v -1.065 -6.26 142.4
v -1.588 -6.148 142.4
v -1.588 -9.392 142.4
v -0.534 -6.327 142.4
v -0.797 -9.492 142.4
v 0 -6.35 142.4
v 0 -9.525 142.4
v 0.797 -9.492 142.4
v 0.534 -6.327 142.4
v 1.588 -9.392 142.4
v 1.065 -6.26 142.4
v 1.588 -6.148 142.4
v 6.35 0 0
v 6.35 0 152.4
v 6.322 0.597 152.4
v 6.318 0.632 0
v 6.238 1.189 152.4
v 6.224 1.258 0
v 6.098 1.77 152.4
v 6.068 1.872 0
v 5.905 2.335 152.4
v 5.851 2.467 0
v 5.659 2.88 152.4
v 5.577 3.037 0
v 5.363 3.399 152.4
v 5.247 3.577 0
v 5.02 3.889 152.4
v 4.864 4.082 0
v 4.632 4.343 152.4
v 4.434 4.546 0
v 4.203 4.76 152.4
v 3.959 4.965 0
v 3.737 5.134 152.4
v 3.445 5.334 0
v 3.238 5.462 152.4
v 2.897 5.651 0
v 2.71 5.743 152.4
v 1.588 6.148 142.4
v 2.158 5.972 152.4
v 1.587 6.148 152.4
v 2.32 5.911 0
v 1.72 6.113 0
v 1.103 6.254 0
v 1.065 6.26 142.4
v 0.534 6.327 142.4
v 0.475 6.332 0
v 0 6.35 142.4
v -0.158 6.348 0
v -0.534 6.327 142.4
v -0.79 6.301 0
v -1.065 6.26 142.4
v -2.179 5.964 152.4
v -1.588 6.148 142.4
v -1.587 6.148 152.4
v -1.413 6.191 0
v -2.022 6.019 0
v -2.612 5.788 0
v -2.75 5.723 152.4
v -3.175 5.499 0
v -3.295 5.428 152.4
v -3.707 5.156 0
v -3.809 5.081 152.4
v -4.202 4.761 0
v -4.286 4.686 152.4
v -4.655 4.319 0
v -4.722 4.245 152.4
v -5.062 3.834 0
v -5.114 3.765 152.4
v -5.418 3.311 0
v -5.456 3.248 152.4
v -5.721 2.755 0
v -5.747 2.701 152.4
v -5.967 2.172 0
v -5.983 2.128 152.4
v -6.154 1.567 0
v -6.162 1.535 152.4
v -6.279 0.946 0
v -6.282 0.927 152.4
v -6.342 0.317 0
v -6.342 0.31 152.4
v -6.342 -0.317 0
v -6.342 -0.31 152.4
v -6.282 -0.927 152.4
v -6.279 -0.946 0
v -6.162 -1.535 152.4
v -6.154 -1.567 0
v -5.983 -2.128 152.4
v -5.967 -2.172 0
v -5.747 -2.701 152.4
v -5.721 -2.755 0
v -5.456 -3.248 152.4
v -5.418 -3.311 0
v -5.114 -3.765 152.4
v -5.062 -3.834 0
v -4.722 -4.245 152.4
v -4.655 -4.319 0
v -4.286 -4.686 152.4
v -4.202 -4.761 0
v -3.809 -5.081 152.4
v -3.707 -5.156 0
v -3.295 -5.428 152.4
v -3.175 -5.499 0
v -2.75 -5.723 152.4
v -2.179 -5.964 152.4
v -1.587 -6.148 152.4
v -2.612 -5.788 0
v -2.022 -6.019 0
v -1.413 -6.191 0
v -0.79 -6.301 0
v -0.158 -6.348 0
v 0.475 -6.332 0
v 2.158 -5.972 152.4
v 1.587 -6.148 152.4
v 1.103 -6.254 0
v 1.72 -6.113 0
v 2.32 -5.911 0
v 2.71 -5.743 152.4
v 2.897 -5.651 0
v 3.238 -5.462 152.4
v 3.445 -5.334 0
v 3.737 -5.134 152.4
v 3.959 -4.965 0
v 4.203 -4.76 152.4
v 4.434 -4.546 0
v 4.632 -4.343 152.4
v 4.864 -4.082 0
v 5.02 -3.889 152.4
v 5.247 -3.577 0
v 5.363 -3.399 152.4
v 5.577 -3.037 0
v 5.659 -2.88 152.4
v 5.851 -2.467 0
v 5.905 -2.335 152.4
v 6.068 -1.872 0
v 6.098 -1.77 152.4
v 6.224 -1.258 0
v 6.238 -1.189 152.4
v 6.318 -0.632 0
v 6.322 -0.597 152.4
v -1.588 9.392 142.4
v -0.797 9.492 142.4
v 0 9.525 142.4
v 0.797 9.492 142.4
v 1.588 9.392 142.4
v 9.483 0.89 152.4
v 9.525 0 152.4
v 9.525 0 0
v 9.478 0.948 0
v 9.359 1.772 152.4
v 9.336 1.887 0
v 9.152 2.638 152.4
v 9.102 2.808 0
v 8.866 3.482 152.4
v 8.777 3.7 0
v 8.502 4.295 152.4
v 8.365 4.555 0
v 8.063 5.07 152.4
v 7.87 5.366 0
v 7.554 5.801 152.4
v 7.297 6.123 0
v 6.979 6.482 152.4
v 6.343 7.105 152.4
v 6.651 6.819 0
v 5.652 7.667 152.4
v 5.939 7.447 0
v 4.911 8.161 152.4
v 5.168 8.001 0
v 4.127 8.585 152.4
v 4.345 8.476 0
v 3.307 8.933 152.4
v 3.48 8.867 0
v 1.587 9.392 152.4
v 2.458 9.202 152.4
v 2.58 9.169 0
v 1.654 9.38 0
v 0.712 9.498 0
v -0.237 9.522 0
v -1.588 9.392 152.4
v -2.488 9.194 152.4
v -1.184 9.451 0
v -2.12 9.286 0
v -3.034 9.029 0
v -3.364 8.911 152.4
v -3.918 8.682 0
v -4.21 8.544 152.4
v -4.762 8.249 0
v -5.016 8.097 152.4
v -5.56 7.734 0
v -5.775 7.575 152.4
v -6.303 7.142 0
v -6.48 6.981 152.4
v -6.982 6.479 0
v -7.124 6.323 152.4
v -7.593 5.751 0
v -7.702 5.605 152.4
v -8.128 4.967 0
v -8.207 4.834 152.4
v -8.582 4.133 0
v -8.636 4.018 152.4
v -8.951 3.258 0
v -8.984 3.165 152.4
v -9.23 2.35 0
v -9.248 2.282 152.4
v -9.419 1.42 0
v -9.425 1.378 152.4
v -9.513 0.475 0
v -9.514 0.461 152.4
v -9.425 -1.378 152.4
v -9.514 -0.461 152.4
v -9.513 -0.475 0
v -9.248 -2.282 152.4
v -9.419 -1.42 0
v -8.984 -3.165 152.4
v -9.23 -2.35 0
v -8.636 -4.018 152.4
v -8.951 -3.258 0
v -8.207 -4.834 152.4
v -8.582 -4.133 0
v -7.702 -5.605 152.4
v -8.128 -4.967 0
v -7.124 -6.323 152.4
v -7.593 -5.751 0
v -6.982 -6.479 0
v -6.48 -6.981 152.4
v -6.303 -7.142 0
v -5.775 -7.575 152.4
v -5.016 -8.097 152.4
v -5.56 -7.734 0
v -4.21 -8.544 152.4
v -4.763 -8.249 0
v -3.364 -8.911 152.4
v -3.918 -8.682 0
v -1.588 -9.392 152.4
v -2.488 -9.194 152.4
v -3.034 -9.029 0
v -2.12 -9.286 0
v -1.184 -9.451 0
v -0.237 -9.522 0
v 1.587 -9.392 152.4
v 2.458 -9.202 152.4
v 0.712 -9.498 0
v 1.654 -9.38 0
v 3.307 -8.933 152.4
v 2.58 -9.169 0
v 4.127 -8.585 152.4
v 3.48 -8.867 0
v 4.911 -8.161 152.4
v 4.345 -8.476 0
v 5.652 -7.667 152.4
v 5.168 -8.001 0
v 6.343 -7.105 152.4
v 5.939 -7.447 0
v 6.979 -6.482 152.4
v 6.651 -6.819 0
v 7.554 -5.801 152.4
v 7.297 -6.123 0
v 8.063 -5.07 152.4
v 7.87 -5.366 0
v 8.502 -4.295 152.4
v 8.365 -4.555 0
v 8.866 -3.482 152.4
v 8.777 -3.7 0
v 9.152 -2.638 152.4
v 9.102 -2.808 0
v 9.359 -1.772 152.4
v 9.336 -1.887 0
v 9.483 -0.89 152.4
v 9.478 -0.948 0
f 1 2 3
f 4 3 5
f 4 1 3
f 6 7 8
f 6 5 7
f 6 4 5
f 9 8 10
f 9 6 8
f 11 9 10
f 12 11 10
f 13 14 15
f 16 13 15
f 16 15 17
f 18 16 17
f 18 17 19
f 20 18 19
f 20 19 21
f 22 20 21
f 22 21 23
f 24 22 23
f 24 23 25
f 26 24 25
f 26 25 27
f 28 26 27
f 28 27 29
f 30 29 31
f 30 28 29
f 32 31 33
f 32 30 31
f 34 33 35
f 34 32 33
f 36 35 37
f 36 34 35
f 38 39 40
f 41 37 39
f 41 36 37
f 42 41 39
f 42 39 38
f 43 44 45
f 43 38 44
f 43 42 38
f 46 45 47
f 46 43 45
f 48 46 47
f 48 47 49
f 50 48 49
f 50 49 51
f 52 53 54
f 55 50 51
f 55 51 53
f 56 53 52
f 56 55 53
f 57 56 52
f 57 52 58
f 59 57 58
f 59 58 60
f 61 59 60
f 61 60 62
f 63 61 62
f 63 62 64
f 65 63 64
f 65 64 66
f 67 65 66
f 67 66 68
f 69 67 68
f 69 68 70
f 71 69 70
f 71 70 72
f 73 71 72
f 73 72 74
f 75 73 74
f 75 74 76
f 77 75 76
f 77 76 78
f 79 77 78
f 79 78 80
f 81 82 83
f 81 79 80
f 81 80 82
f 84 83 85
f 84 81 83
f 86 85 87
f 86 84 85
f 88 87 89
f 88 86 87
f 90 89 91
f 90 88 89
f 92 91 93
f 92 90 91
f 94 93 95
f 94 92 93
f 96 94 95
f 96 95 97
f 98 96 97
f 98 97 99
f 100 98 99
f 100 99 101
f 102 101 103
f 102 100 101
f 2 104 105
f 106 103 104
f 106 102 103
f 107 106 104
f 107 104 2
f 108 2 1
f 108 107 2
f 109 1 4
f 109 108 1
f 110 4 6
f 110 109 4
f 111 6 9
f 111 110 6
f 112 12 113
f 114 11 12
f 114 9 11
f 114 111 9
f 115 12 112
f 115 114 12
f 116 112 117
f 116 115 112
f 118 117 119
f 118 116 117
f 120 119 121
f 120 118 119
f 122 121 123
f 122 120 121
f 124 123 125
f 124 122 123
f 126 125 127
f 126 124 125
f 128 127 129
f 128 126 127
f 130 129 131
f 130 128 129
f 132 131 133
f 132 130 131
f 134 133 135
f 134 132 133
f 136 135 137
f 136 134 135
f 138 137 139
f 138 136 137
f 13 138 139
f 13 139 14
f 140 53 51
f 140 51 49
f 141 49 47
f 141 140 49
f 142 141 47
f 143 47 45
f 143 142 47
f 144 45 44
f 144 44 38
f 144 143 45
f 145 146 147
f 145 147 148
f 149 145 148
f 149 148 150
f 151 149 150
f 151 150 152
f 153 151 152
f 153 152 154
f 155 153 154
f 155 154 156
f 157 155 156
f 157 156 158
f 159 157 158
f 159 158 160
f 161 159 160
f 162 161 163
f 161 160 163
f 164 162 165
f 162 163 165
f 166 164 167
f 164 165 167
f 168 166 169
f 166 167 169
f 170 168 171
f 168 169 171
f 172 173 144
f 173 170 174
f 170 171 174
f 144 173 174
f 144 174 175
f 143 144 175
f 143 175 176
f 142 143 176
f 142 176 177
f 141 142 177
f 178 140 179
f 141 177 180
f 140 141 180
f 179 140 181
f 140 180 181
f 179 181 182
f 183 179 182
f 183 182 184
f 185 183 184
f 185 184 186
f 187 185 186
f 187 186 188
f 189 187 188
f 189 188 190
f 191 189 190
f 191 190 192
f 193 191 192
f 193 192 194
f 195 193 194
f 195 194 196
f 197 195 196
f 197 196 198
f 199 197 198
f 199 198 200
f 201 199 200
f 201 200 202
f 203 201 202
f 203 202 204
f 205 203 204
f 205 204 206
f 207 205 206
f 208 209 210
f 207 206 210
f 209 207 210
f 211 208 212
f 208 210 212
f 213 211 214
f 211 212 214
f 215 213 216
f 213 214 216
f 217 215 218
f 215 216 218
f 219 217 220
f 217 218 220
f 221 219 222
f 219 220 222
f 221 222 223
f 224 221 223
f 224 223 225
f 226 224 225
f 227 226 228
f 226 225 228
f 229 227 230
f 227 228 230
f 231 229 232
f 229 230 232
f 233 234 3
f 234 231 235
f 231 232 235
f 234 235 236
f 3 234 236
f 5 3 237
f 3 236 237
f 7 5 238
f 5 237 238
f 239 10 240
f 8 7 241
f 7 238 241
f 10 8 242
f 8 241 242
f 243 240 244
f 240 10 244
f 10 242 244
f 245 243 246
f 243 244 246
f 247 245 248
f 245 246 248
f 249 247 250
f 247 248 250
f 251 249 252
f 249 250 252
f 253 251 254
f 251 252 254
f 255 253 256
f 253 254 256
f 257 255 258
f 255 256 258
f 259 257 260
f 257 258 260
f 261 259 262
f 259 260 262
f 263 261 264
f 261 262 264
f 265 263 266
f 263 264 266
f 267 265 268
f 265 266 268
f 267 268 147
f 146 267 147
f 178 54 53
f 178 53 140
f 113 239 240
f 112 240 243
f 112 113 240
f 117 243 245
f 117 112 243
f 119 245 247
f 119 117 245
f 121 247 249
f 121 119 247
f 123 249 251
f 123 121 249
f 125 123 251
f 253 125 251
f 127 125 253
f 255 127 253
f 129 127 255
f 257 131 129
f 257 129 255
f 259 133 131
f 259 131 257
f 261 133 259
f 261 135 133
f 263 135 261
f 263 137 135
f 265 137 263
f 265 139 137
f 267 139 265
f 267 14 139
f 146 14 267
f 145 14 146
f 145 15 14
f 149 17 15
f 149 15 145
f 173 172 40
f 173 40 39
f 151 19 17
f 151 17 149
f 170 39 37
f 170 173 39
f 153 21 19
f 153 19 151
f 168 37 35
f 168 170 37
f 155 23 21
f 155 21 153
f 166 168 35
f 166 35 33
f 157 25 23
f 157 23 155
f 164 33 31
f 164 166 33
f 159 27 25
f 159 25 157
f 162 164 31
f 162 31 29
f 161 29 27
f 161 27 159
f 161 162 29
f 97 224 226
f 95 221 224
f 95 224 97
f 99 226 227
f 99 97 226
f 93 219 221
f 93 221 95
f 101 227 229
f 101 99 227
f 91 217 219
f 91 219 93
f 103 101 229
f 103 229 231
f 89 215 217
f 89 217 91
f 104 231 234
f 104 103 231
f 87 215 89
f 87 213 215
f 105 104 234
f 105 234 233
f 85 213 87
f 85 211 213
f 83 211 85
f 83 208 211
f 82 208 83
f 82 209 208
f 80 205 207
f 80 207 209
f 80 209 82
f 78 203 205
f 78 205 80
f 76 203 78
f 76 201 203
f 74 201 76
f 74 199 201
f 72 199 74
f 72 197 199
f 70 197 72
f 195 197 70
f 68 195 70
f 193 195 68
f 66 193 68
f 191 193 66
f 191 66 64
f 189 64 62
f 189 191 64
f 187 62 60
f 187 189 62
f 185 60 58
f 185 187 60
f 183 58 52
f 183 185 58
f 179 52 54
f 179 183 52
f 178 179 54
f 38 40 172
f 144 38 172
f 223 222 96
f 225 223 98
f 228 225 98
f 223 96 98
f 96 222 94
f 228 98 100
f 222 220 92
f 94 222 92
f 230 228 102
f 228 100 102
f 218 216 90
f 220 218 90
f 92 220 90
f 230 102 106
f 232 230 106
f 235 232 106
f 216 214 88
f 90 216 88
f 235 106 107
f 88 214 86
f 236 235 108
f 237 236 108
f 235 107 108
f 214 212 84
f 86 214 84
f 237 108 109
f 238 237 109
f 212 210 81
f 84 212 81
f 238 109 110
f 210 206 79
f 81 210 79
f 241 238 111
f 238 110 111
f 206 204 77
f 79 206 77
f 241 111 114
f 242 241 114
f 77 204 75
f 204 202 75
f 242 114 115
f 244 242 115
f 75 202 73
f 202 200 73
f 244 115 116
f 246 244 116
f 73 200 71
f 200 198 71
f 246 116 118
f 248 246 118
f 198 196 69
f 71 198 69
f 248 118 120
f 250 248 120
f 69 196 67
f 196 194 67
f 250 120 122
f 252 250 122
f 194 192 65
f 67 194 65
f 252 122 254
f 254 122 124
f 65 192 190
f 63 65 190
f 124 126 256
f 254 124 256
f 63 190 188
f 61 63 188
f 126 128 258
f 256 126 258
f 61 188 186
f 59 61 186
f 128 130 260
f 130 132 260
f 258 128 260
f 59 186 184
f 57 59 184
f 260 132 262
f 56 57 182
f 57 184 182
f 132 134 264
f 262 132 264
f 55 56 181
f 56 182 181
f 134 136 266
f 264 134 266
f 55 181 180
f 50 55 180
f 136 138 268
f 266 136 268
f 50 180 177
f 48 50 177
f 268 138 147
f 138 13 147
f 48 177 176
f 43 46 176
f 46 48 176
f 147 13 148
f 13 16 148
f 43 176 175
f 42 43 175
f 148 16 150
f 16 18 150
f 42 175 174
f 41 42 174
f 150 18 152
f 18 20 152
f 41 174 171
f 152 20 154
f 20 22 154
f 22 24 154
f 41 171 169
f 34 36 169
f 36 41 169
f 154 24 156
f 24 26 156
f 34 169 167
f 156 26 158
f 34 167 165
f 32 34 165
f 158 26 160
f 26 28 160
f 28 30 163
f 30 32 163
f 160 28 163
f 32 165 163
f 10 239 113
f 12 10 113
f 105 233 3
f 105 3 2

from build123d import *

# Parameters (mm, degrees)
SKETCH1_R           = 9.525
SKETCH1_R_2         = 6.35
BOSS_EXTRUDE1_DEPTH = 152.4
SKETCH2_W           = 3.175
SKETCH2_H           = 25.179063452
CUT_EXTRUDE1_DEPTH  = 10


with BuildPart() as part:
    # Sketch1 → Boss-Extrude1 (new body)
    with BuildSketch(Plane.XY):
        Circle(SKETCH1_R)
        Circle(SKETCH1_R_2, mode=Mode.SUBTRACT)
    extrude(amount=BOSS_EXTRUDE1_DEPTH)

    # Sketch2 → Cut-Extrude1 (cut)
    with BuildSketch(Plane.XY.offset(152.4)):
        Rectangle(SKETCH2_W, SKETCH2_H)
    extrude(amount=-CUT_EXTRUDE1_DEPTH, mode=Mode.SUBTRACT)


solid = part.part
